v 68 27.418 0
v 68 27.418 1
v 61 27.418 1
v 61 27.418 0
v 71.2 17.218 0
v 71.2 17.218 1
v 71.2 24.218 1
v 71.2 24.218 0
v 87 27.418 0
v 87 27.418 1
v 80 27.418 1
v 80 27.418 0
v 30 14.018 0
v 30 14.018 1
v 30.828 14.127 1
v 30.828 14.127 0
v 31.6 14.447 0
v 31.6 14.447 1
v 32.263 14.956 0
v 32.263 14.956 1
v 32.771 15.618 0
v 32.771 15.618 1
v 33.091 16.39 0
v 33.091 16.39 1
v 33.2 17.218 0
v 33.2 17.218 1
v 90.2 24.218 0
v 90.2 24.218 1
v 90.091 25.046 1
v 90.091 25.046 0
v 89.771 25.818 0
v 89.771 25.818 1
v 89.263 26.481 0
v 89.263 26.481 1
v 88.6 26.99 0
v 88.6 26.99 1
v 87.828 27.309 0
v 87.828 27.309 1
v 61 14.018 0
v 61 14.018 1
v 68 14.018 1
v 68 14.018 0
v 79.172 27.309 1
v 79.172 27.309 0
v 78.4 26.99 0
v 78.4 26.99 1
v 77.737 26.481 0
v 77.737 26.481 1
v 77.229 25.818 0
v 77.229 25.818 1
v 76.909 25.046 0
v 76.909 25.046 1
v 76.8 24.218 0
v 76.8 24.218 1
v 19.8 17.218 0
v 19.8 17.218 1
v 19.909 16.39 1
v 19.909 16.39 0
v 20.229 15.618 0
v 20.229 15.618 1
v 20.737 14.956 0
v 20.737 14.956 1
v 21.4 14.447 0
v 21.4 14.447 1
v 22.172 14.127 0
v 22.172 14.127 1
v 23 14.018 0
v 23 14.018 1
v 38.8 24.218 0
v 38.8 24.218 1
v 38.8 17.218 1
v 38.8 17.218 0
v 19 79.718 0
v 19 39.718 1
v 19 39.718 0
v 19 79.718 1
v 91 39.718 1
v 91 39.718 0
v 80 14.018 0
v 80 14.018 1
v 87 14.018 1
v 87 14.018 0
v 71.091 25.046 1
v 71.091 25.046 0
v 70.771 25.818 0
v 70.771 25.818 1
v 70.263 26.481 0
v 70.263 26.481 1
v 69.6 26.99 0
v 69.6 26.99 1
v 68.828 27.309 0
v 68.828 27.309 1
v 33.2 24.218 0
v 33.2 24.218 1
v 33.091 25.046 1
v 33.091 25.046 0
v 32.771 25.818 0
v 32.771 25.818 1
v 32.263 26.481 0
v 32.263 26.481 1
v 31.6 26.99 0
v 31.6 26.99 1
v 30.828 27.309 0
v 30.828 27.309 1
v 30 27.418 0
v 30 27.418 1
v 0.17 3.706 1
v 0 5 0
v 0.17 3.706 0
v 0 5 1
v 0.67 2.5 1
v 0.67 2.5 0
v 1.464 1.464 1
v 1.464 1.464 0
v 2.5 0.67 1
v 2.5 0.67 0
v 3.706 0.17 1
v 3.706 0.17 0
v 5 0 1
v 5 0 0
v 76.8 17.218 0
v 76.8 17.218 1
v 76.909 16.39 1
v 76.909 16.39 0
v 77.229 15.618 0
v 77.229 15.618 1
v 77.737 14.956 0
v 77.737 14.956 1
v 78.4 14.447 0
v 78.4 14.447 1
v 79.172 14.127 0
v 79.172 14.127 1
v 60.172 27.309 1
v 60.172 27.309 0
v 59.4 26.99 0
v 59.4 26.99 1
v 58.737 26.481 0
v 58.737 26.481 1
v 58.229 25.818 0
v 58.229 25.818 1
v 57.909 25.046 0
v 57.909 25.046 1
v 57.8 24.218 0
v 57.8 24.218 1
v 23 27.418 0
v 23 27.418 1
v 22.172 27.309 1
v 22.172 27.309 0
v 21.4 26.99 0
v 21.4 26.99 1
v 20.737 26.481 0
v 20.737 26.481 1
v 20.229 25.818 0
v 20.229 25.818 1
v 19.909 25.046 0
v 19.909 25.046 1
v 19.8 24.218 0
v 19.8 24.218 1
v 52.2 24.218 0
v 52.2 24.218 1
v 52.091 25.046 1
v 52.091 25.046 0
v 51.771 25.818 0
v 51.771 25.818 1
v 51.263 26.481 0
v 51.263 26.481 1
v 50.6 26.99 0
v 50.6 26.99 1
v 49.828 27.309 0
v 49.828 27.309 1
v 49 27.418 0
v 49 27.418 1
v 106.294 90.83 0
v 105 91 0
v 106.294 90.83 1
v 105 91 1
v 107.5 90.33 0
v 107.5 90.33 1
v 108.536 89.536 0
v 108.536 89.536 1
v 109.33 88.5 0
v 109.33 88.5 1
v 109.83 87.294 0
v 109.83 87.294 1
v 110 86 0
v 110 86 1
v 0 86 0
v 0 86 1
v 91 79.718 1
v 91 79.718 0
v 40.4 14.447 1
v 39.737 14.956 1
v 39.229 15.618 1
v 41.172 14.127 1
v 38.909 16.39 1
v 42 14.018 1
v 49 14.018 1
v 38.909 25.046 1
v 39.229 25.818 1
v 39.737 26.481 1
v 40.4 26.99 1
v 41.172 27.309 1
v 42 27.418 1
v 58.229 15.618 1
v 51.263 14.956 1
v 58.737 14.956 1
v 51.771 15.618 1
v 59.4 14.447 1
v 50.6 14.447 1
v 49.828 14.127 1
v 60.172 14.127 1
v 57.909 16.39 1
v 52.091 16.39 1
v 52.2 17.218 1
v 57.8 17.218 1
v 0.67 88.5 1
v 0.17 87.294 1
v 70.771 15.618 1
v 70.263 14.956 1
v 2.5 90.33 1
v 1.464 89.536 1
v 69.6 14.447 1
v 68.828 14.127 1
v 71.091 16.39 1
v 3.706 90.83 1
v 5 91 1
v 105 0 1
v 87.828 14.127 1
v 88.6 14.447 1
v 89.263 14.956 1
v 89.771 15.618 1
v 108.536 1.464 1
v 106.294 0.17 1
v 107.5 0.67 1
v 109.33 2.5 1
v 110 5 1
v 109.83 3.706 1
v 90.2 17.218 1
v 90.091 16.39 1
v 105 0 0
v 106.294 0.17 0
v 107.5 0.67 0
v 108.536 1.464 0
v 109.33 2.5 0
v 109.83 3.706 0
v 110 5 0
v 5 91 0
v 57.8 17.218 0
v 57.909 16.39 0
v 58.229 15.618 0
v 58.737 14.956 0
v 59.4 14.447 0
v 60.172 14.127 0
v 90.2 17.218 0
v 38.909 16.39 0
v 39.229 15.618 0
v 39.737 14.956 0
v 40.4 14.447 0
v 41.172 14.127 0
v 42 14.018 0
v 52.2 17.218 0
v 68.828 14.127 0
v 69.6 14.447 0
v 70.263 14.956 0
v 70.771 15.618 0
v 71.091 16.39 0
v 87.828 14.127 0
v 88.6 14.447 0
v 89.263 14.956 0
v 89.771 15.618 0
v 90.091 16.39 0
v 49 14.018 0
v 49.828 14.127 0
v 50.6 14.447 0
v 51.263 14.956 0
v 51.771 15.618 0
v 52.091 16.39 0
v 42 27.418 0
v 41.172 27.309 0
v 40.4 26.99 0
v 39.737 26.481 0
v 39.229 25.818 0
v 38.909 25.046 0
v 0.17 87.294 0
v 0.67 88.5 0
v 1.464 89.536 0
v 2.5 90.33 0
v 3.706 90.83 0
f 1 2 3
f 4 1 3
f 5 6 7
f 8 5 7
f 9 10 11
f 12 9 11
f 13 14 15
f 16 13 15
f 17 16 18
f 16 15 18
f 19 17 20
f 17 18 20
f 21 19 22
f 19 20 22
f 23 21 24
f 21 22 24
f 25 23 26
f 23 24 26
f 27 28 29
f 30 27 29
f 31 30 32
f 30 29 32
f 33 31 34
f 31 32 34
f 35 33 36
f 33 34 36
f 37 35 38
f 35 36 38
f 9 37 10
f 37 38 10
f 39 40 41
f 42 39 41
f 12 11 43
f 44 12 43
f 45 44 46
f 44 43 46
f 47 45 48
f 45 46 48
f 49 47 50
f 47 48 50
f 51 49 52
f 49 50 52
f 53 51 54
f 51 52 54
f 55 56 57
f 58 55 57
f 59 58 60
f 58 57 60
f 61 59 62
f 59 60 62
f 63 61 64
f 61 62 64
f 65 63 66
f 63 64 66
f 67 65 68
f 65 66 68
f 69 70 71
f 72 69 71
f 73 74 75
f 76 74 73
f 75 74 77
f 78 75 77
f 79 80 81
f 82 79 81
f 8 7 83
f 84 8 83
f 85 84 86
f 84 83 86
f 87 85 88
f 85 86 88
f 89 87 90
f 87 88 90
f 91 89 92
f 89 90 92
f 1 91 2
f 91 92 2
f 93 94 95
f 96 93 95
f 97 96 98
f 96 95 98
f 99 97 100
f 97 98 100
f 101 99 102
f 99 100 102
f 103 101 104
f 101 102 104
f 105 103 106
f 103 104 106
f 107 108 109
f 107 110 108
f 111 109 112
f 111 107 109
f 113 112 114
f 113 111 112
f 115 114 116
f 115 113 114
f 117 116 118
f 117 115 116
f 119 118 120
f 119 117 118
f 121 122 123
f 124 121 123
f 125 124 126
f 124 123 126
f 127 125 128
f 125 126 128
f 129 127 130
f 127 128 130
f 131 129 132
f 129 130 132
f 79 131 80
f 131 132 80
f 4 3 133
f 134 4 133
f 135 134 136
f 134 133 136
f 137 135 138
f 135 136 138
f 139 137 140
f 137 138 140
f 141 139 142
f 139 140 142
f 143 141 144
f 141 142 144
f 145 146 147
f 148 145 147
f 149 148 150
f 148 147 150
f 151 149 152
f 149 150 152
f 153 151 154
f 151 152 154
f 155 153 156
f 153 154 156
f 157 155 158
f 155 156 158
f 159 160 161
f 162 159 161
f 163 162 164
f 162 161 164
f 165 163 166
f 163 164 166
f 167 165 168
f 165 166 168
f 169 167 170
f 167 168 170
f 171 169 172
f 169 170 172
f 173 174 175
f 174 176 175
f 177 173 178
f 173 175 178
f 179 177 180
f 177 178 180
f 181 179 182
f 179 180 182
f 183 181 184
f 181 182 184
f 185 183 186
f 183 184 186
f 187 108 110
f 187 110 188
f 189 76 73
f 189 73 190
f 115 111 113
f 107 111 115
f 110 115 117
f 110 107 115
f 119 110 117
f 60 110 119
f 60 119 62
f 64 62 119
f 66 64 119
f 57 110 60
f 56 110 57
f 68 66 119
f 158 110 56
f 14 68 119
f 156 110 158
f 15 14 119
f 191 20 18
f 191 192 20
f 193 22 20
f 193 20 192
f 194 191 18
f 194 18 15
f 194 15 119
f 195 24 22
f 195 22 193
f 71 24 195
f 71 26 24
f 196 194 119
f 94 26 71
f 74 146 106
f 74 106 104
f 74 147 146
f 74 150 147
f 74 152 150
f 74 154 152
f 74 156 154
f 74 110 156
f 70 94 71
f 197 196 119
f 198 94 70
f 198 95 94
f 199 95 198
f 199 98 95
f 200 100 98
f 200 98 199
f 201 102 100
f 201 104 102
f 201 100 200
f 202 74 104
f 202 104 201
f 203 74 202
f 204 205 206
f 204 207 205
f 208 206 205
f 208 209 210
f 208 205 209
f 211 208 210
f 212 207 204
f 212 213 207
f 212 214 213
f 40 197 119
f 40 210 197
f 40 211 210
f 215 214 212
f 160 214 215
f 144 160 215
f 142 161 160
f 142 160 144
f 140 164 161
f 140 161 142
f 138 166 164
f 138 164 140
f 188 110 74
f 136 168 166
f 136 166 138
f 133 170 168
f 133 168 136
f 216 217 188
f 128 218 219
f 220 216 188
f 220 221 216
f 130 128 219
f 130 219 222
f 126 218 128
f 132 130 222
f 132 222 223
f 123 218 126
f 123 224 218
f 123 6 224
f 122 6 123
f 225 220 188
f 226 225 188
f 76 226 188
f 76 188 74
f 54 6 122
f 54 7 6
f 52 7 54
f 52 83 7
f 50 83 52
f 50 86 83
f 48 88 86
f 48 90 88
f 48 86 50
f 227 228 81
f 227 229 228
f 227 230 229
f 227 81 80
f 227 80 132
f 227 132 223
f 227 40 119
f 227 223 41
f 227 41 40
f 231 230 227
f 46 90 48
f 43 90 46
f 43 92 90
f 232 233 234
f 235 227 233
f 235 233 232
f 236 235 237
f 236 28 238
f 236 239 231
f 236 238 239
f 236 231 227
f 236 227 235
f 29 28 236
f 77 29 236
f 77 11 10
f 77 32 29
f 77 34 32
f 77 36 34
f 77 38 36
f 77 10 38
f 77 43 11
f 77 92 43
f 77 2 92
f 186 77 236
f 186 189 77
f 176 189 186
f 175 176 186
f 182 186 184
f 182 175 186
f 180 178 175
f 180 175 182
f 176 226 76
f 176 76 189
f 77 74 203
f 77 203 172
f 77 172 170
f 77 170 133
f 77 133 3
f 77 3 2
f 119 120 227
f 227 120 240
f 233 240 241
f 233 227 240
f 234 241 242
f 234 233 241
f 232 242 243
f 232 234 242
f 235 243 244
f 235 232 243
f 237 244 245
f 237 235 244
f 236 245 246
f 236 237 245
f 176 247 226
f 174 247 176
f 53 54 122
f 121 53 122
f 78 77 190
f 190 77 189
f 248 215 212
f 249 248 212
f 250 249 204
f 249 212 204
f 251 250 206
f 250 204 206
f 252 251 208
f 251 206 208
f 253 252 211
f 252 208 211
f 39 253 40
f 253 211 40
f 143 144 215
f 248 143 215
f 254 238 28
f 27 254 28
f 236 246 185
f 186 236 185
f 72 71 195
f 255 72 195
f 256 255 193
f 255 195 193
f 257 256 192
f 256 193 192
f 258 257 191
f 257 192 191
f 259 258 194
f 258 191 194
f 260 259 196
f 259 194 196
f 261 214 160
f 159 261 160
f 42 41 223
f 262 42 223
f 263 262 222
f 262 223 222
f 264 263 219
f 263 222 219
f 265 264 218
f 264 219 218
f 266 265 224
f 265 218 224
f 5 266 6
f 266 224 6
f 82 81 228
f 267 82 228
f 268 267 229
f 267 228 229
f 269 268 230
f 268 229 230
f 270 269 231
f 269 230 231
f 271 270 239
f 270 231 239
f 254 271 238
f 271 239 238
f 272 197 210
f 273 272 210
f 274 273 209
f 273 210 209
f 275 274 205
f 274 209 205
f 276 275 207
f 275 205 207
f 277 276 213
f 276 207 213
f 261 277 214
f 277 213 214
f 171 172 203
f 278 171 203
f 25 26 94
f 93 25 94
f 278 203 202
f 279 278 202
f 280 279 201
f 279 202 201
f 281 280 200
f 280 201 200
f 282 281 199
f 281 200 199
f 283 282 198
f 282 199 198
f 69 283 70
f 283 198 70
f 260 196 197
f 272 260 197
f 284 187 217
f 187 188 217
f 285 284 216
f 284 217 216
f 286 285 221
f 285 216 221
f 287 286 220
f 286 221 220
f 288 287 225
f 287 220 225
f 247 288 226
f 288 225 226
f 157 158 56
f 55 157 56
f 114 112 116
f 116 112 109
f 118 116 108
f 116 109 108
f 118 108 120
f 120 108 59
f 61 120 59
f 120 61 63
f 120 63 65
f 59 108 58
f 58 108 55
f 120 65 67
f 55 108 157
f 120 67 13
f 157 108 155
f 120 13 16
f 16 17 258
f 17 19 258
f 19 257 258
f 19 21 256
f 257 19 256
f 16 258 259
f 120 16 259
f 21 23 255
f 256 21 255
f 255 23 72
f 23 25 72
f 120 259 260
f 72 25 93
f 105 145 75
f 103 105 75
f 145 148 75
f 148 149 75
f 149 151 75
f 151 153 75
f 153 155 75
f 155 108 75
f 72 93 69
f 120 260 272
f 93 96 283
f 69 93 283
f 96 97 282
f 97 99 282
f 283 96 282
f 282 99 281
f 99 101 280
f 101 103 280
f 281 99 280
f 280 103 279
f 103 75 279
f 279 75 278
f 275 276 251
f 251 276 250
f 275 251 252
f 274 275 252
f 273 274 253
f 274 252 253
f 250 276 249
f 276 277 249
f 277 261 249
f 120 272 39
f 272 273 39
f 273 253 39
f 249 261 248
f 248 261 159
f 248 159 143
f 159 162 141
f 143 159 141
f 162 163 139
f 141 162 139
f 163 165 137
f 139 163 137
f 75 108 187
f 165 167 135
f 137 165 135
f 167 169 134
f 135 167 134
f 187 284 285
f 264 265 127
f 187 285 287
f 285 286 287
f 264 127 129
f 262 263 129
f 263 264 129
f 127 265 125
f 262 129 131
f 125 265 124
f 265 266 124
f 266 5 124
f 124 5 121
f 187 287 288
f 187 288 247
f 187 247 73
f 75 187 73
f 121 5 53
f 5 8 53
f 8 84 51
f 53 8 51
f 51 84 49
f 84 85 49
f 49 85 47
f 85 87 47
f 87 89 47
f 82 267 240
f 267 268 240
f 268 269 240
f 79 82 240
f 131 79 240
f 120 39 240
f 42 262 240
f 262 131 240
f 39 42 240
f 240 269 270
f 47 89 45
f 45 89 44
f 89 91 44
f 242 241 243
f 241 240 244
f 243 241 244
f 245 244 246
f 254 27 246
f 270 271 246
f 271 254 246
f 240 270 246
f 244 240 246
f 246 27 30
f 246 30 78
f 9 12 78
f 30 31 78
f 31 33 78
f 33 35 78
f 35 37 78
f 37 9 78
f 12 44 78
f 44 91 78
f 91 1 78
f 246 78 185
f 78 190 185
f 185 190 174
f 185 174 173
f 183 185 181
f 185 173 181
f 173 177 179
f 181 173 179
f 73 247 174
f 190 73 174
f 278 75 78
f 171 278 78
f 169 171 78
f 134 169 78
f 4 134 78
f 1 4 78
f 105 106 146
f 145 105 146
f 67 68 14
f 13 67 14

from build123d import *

# Parameters (mm, degrees)
F0_W     = 110
F0_H     = 91
F1_DEPTH = 1
F2_W     = 72
F2_H     = 40
F3_DEPTH = 1.001
F4_R     = 5
F6_DEPTH = 1.001


with BuildPart() as f1:
    # F0 (on Top) → F1 (new body)
    with BuildSketch(Plane.XY):
        with Locations((55, 45.5)):
            Rectangle(F0_W, F0_H)
    extrude(amount=F1_DEPTH)

    # F2 (on face) → F3 (cut, through all)
    with BuildSketch(Plane.XY.offset(1)):
        with Locations((55, 59.718266)):
            Rectangle(F2_W, F2_H)
    extrude(amount=-F3_DEPTH, mode=Mode.SUBTRACT)

    # F4
    f4_edges = [f1.edges().sort_by_distance(p)[0] for p in [
        (0, 91, 0.5),
        (0, 0, 0.5),
        (110, 91, 0.5),
        (110, 0, 0.5),
    ]]
    fillet(f4_edges, radius=F4_R)

    # F5 (on face) → F6 (cut, through all)
    with BuildSketch(Plane.XY.offset(1)):
        with BuildLine():
            Line((30, 27.418266), (23, 27.418266))
            ThreePointArc((23, 27.418266), (20.737258, 26.481008), (19.8, 24.218266))
            Line((19.8, 24.218266), (19.8, 17.218266))
            ThreePointArc((19.8, 17.218266), (20.737258, 14.955525), (23, 14.018266))
            Line((23, 14.018266), (30, 14.018266))
            ThreePointArc((30, 14.018266), (32.262742, 14.955525), (33.2, 17.218266))
            Line((33.2, 17.218266), (33.2, 24.218266))
            ThreePointArc((33.2, 24.218266), (32.262742, 26.481008), (30, 27.418266))
        make_face()
        with BuildLine():
            Line((49, 27.418266), (42, 27.418266))
            ThreePointArc((42, 27.418266), (39.737258, 26.481008), (38.8, 24.218266))
            Line((38.8, 24.218266), (38.8, 17.218266))
            ThreePointArc((38.8, 17.218266), (39.737258, 14.955525), (42, 14.018266))
            Line((42, 14.018266), (49, 14.018266))
            ThreePointArc((49, 14.018266), (51.262742, 14.955525), (52.2, 17.218266))
            Line((52.2, 17.218266), (52.2, 24.218266))
            ThreePointArc((52.2, 24.218266), (51.262742, 26.481008), (49, 27.418266))
        make_face()
        with BuildLine():
            Line((68, 27.418266), (61, 27.418266))
            ThreePointArc((61, 27.418266), (58.737258, 26.481008), (57.8, 24.218266))
            Line((57.8, 24.218266), (57.8, 17.218266))
            ThreePointArc((57.8, 17.218266), (58.737258, 14.955525), (61, 14.018266))
            Line((61, 14.018266), (68, 14.018266))
            ThreePointArc((68, 14.018266), (70.262742, 14.955525), (71.2, 17.218266))
            Line((71.2, 17.218266), (71.2, 24.218266))
            ThreePointArc((71.2, 24.218266), (70.262742, 26.481008), (68, 27.418266))
        make_face()
        with BuildLine():
            Line((87, 27.418266), (80, 27.418266))
            ThreePointArc((80, 27.418266), (77.737258, 26.481008), (76.8, 24.218266))
            Line((76.8, 24.218266), (76.8, 17.218266))
            ThreePointArc((76.8, 17.218266), (77.737258, 14.955525), (80, 14.018266))
            Line((80, 14.018266), (87, 14.018266))
            ThreePointArc((87, 14.018266), (89.262742, 14.955525), (90.2, 17.218266))
            Line((90.2, 17.218266), (90.2, 24.218266))
            ThreePointArc((90.2, 24.218266), (89.262742, 26.481008), (87, 27.418266))
        make_face()
    extrude(amount=-F6_DEPTH, mode=Mode.SUBTRACT)


solid = f1.part
